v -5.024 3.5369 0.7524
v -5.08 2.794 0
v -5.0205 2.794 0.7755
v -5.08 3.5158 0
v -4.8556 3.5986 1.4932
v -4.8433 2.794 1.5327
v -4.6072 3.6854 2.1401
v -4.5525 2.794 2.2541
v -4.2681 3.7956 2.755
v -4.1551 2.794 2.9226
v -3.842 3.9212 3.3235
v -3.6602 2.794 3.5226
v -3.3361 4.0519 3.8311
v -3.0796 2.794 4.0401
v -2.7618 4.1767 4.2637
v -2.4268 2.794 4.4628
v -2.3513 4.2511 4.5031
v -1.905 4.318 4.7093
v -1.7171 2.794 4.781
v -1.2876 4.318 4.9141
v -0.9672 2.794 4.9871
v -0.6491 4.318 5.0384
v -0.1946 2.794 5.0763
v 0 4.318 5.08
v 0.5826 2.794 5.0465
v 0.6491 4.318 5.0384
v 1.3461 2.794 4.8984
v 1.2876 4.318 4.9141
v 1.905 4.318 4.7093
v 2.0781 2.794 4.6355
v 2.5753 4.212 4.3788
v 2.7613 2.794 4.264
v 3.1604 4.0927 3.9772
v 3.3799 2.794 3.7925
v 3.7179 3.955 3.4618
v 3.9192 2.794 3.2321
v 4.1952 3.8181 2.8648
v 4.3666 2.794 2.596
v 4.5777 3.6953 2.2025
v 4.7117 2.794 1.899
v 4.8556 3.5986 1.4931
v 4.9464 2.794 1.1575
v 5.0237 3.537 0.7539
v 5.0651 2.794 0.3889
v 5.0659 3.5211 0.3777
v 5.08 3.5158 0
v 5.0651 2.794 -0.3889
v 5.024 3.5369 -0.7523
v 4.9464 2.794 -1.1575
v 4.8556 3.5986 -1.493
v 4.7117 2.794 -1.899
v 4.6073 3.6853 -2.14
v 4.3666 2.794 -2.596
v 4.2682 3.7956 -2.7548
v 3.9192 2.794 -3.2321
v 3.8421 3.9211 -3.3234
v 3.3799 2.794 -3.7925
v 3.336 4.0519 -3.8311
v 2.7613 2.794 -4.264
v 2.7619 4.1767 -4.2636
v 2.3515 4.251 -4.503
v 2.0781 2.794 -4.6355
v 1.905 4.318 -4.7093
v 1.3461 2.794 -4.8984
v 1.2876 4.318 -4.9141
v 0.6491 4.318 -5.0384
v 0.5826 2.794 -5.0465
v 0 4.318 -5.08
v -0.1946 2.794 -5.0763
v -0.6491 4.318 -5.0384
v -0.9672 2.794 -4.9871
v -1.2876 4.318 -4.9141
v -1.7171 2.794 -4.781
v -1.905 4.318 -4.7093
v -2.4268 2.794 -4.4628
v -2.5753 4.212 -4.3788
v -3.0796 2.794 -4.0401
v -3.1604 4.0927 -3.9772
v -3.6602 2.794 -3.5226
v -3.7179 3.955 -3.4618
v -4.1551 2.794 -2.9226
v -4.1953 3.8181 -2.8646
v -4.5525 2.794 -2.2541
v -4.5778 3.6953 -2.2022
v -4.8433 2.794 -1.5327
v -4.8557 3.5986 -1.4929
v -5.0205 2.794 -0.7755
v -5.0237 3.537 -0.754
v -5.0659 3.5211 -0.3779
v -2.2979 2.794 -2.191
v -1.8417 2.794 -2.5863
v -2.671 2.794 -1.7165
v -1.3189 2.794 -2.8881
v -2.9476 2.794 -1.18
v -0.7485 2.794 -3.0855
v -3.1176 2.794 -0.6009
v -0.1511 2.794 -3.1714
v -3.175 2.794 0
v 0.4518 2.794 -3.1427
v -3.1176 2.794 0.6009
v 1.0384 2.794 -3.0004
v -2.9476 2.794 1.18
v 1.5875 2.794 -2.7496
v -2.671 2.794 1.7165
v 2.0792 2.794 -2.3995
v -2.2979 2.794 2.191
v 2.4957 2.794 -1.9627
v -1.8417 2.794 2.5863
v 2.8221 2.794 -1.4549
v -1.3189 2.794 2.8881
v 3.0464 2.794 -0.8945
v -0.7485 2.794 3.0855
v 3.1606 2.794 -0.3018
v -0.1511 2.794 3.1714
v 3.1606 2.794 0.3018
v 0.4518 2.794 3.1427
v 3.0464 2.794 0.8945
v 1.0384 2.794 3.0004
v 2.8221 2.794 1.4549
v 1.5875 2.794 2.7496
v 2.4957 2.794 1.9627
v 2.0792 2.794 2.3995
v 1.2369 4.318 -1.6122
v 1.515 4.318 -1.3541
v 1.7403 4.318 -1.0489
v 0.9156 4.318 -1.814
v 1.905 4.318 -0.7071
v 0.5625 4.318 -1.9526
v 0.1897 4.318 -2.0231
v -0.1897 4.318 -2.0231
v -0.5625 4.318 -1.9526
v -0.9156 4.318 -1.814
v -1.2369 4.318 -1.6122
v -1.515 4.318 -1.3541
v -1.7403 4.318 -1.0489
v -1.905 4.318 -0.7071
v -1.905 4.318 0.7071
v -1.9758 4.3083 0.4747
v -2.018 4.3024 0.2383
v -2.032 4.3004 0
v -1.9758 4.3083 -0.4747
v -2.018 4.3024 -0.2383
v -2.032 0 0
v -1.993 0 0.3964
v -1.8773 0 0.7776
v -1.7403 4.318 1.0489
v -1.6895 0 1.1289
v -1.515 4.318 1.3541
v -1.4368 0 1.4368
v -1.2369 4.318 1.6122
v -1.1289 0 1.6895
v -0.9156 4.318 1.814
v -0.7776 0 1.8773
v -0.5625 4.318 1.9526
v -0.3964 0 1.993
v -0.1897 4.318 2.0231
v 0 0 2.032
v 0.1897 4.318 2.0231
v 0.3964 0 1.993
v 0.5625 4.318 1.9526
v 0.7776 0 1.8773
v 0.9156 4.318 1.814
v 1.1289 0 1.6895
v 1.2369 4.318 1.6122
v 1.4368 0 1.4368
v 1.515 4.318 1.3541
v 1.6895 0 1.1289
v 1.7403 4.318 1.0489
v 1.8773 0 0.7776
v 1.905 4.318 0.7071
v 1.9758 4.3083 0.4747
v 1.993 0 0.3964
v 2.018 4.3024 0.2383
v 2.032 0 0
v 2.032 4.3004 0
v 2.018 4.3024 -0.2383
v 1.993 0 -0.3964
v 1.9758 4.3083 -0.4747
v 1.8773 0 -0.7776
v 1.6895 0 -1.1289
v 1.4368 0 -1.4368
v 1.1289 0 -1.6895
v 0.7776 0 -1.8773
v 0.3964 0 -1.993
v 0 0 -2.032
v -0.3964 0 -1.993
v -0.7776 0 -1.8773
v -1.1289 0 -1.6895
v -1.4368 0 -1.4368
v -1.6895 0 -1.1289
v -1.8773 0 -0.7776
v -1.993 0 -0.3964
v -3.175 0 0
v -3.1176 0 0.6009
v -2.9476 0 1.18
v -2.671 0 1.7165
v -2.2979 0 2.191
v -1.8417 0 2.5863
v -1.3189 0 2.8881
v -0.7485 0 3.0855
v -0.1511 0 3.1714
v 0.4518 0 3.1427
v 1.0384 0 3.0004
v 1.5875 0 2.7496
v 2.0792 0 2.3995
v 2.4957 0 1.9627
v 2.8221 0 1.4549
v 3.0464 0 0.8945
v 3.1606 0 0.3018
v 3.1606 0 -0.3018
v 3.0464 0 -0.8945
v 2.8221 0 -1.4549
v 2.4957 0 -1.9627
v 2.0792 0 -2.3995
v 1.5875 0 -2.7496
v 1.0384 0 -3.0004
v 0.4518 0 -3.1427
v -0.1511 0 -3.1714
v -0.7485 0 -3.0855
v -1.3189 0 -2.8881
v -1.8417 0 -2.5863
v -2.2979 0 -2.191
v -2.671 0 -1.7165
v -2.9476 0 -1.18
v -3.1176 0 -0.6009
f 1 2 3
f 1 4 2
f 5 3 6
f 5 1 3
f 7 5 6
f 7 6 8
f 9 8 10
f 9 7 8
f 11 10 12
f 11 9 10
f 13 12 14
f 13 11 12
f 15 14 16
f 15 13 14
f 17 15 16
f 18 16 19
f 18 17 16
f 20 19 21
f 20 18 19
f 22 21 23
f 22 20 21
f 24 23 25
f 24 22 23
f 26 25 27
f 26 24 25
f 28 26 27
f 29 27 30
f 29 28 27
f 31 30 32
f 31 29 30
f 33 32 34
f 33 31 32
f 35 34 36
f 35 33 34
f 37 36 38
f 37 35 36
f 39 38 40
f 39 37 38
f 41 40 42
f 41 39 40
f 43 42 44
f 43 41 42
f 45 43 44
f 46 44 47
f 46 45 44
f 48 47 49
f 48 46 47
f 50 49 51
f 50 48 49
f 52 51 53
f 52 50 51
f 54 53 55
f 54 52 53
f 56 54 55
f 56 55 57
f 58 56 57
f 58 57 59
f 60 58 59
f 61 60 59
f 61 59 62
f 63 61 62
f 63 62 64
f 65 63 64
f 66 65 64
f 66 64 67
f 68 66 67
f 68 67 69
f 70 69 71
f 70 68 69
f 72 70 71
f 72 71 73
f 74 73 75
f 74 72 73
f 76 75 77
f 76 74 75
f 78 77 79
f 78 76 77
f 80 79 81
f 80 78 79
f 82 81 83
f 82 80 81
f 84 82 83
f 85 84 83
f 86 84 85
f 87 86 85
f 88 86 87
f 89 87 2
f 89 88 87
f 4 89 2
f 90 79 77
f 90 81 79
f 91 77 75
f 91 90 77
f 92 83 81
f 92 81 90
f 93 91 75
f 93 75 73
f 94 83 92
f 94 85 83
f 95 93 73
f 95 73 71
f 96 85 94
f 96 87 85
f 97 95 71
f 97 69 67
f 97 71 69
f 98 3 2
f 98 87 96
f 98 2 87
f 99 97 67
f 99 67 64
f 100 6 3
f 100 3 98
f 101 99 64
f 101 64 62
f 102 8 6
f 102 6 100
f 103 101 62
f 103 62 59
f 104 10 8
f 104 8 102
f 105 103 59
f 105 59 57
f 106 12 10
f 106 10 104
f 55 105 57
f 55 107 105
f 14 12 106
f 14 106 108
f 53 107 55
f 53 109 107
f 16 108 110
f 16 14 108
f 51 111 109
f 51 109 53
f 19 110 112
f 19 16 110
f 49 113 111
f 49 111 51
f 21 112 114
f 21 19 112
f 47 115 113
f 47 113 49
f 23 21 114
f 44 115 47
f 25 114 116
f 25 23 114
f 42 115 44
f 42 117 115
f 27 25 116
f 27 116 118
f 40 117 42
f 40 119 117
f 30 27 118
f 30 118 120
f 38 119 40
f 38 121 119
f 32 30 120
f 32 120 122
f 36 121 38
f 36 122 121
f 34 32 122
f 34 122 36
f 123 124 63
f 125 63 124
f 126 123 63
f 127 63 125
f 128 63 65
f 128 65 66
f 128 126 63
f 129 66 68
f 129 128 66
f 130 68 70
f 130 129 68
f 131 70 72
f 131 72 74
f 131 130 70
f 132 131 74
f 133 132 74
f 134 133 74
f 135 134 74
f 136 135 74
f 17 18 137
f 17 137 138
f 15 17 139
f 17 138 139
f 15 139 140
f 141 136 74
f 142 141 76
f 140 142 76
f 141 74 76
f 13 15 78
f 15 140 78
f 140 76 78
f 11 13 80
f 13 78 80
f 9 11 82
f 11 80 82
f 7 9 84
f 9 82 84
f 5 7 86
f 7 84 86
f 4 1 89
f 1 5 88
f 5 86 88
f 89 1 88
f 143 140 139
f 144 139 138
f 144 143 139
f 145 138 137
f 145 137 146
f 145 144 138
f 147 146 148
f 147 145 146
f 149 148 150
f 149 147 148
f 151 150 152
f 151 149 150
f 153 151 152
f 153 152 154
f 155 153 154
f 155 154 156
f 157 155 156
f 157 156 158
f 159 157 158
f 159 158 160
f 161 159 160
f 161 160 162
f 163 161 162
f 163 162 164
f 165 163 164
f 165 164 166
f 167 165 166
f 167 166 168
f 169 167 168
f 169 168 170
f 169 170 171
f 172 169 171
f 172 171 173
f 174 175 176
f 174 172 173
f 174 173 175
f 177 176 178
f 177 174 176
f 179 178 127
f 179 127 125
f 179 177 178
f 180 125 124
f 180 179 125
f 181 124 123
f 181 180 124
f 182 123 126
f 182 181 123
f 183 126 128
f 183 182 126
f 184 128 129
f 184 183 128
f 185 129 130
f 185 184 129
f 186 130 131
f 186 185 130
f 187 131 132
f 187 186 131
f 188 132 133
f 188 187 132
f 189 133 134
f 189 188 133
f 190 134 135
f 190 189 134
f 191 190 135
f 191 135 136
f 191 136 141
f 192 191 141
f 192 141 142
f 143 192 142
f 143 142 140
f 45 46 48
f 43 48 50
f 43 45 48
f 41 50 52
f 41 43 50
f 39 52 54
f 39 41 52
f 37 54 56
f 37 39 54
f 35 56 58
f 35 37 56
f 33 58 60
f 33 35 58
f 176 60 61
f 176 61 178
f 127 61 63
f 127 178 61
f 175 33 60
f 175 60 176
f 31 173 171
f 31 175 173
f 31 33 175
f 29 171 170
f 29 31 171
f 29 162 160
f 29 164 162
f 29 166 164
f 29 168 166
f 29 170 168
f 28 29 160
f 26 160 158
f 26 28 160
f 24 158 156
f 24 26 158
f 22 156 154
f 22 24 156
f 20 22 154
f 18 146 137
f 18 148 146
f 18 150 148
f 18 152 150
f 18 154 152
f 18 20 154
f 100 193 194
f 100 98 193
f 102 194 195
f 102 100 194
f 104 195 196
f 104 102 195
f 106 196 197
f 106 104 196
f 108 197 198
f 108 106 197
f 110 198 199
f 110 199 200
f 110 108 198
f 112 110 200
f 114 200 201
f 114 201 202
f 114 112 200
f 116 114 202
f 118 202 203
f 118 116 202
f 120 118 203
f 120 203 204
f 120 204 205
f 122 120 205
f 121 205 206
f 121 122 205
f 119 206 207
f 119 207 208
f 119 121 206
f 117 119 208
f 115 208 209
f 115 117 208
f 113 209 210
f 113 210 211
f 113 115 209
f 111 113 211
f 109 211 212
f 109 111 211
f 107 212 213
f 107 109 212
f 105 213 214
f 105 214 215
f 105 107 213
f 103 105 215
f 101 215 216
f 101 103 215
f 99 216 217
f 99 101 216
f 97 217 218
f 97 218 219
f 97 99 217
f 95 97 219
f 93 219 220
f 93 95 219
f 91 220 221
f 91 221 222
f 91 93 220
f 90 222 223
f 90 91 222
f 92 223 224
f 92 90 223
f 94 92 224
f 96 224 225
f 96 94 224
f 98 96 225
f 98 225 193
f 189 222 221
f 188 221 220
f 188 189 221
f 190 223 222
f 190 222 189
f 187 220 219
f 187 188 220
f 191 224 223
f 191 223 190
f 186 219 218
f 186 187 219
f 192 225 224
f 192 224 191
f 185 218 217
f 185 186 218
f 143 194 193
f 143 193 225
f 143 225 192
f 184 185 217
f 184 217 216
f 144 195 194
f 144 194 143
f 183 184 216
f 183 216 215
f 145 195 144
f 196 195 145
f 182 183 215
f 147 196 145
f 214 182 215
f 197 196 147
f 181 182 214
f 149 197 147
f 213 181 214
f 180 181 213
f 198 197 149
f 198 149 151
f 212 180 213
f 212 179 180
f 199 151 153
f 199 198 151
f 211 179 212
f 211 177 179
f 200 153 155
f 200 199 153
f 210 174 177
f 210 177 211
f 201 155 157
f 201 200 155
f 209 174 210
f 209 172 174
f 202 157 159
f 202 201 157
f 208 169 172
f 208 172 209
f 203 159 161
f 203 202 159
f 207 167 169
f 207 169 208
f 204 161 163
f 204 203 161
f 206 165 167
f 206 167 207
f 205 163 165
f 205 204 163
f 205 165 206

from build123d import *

# Parameters (mm, degrees)
SKETCH3_R               = 19.05
SKETCH3_R_2             = 14.351
CUT_EXTRUDE1_DEPTH      = 6.08
CUT_EXTRUDE1_DEPTH_BACK = 6.08


with BuildPart() as part:
    # Sketch1 → Revolve1 (revolve)
    with BuildSketch(Plane.XY):
        Polygon((-2.032, 0), (-3.175, 0), (-3.175, 2.794), (-5.08, 2.794), (-5.08, 4.318), (-2.032, 4.318), align=None)
    revolve(axis=Axis((0, 0, 0), (0, 1, 0)))

    # Sketch3 → Cut-Extrude1 (cut, two sides)
    with BuildSketch(Plane.XY) as cut_extrude1_sk:
        with Locations((0, -9.906)):
            Circle(SKETCH3_R)
        with Locations((0, -9.906)):
            Circle(SKETCH3_R_2, mode=Mode.SUBTRACT)
    extrude(amount=CUT_EXTRUDE1_DEPTH, mode=Mode.SUBTRACT)
    extrude(cut_extrude1_sk.sketch, amount=-CUT_EXTRUDE1_DEPTH_BACK, mode=Mode.SUBTRACT)


solid = part.part
